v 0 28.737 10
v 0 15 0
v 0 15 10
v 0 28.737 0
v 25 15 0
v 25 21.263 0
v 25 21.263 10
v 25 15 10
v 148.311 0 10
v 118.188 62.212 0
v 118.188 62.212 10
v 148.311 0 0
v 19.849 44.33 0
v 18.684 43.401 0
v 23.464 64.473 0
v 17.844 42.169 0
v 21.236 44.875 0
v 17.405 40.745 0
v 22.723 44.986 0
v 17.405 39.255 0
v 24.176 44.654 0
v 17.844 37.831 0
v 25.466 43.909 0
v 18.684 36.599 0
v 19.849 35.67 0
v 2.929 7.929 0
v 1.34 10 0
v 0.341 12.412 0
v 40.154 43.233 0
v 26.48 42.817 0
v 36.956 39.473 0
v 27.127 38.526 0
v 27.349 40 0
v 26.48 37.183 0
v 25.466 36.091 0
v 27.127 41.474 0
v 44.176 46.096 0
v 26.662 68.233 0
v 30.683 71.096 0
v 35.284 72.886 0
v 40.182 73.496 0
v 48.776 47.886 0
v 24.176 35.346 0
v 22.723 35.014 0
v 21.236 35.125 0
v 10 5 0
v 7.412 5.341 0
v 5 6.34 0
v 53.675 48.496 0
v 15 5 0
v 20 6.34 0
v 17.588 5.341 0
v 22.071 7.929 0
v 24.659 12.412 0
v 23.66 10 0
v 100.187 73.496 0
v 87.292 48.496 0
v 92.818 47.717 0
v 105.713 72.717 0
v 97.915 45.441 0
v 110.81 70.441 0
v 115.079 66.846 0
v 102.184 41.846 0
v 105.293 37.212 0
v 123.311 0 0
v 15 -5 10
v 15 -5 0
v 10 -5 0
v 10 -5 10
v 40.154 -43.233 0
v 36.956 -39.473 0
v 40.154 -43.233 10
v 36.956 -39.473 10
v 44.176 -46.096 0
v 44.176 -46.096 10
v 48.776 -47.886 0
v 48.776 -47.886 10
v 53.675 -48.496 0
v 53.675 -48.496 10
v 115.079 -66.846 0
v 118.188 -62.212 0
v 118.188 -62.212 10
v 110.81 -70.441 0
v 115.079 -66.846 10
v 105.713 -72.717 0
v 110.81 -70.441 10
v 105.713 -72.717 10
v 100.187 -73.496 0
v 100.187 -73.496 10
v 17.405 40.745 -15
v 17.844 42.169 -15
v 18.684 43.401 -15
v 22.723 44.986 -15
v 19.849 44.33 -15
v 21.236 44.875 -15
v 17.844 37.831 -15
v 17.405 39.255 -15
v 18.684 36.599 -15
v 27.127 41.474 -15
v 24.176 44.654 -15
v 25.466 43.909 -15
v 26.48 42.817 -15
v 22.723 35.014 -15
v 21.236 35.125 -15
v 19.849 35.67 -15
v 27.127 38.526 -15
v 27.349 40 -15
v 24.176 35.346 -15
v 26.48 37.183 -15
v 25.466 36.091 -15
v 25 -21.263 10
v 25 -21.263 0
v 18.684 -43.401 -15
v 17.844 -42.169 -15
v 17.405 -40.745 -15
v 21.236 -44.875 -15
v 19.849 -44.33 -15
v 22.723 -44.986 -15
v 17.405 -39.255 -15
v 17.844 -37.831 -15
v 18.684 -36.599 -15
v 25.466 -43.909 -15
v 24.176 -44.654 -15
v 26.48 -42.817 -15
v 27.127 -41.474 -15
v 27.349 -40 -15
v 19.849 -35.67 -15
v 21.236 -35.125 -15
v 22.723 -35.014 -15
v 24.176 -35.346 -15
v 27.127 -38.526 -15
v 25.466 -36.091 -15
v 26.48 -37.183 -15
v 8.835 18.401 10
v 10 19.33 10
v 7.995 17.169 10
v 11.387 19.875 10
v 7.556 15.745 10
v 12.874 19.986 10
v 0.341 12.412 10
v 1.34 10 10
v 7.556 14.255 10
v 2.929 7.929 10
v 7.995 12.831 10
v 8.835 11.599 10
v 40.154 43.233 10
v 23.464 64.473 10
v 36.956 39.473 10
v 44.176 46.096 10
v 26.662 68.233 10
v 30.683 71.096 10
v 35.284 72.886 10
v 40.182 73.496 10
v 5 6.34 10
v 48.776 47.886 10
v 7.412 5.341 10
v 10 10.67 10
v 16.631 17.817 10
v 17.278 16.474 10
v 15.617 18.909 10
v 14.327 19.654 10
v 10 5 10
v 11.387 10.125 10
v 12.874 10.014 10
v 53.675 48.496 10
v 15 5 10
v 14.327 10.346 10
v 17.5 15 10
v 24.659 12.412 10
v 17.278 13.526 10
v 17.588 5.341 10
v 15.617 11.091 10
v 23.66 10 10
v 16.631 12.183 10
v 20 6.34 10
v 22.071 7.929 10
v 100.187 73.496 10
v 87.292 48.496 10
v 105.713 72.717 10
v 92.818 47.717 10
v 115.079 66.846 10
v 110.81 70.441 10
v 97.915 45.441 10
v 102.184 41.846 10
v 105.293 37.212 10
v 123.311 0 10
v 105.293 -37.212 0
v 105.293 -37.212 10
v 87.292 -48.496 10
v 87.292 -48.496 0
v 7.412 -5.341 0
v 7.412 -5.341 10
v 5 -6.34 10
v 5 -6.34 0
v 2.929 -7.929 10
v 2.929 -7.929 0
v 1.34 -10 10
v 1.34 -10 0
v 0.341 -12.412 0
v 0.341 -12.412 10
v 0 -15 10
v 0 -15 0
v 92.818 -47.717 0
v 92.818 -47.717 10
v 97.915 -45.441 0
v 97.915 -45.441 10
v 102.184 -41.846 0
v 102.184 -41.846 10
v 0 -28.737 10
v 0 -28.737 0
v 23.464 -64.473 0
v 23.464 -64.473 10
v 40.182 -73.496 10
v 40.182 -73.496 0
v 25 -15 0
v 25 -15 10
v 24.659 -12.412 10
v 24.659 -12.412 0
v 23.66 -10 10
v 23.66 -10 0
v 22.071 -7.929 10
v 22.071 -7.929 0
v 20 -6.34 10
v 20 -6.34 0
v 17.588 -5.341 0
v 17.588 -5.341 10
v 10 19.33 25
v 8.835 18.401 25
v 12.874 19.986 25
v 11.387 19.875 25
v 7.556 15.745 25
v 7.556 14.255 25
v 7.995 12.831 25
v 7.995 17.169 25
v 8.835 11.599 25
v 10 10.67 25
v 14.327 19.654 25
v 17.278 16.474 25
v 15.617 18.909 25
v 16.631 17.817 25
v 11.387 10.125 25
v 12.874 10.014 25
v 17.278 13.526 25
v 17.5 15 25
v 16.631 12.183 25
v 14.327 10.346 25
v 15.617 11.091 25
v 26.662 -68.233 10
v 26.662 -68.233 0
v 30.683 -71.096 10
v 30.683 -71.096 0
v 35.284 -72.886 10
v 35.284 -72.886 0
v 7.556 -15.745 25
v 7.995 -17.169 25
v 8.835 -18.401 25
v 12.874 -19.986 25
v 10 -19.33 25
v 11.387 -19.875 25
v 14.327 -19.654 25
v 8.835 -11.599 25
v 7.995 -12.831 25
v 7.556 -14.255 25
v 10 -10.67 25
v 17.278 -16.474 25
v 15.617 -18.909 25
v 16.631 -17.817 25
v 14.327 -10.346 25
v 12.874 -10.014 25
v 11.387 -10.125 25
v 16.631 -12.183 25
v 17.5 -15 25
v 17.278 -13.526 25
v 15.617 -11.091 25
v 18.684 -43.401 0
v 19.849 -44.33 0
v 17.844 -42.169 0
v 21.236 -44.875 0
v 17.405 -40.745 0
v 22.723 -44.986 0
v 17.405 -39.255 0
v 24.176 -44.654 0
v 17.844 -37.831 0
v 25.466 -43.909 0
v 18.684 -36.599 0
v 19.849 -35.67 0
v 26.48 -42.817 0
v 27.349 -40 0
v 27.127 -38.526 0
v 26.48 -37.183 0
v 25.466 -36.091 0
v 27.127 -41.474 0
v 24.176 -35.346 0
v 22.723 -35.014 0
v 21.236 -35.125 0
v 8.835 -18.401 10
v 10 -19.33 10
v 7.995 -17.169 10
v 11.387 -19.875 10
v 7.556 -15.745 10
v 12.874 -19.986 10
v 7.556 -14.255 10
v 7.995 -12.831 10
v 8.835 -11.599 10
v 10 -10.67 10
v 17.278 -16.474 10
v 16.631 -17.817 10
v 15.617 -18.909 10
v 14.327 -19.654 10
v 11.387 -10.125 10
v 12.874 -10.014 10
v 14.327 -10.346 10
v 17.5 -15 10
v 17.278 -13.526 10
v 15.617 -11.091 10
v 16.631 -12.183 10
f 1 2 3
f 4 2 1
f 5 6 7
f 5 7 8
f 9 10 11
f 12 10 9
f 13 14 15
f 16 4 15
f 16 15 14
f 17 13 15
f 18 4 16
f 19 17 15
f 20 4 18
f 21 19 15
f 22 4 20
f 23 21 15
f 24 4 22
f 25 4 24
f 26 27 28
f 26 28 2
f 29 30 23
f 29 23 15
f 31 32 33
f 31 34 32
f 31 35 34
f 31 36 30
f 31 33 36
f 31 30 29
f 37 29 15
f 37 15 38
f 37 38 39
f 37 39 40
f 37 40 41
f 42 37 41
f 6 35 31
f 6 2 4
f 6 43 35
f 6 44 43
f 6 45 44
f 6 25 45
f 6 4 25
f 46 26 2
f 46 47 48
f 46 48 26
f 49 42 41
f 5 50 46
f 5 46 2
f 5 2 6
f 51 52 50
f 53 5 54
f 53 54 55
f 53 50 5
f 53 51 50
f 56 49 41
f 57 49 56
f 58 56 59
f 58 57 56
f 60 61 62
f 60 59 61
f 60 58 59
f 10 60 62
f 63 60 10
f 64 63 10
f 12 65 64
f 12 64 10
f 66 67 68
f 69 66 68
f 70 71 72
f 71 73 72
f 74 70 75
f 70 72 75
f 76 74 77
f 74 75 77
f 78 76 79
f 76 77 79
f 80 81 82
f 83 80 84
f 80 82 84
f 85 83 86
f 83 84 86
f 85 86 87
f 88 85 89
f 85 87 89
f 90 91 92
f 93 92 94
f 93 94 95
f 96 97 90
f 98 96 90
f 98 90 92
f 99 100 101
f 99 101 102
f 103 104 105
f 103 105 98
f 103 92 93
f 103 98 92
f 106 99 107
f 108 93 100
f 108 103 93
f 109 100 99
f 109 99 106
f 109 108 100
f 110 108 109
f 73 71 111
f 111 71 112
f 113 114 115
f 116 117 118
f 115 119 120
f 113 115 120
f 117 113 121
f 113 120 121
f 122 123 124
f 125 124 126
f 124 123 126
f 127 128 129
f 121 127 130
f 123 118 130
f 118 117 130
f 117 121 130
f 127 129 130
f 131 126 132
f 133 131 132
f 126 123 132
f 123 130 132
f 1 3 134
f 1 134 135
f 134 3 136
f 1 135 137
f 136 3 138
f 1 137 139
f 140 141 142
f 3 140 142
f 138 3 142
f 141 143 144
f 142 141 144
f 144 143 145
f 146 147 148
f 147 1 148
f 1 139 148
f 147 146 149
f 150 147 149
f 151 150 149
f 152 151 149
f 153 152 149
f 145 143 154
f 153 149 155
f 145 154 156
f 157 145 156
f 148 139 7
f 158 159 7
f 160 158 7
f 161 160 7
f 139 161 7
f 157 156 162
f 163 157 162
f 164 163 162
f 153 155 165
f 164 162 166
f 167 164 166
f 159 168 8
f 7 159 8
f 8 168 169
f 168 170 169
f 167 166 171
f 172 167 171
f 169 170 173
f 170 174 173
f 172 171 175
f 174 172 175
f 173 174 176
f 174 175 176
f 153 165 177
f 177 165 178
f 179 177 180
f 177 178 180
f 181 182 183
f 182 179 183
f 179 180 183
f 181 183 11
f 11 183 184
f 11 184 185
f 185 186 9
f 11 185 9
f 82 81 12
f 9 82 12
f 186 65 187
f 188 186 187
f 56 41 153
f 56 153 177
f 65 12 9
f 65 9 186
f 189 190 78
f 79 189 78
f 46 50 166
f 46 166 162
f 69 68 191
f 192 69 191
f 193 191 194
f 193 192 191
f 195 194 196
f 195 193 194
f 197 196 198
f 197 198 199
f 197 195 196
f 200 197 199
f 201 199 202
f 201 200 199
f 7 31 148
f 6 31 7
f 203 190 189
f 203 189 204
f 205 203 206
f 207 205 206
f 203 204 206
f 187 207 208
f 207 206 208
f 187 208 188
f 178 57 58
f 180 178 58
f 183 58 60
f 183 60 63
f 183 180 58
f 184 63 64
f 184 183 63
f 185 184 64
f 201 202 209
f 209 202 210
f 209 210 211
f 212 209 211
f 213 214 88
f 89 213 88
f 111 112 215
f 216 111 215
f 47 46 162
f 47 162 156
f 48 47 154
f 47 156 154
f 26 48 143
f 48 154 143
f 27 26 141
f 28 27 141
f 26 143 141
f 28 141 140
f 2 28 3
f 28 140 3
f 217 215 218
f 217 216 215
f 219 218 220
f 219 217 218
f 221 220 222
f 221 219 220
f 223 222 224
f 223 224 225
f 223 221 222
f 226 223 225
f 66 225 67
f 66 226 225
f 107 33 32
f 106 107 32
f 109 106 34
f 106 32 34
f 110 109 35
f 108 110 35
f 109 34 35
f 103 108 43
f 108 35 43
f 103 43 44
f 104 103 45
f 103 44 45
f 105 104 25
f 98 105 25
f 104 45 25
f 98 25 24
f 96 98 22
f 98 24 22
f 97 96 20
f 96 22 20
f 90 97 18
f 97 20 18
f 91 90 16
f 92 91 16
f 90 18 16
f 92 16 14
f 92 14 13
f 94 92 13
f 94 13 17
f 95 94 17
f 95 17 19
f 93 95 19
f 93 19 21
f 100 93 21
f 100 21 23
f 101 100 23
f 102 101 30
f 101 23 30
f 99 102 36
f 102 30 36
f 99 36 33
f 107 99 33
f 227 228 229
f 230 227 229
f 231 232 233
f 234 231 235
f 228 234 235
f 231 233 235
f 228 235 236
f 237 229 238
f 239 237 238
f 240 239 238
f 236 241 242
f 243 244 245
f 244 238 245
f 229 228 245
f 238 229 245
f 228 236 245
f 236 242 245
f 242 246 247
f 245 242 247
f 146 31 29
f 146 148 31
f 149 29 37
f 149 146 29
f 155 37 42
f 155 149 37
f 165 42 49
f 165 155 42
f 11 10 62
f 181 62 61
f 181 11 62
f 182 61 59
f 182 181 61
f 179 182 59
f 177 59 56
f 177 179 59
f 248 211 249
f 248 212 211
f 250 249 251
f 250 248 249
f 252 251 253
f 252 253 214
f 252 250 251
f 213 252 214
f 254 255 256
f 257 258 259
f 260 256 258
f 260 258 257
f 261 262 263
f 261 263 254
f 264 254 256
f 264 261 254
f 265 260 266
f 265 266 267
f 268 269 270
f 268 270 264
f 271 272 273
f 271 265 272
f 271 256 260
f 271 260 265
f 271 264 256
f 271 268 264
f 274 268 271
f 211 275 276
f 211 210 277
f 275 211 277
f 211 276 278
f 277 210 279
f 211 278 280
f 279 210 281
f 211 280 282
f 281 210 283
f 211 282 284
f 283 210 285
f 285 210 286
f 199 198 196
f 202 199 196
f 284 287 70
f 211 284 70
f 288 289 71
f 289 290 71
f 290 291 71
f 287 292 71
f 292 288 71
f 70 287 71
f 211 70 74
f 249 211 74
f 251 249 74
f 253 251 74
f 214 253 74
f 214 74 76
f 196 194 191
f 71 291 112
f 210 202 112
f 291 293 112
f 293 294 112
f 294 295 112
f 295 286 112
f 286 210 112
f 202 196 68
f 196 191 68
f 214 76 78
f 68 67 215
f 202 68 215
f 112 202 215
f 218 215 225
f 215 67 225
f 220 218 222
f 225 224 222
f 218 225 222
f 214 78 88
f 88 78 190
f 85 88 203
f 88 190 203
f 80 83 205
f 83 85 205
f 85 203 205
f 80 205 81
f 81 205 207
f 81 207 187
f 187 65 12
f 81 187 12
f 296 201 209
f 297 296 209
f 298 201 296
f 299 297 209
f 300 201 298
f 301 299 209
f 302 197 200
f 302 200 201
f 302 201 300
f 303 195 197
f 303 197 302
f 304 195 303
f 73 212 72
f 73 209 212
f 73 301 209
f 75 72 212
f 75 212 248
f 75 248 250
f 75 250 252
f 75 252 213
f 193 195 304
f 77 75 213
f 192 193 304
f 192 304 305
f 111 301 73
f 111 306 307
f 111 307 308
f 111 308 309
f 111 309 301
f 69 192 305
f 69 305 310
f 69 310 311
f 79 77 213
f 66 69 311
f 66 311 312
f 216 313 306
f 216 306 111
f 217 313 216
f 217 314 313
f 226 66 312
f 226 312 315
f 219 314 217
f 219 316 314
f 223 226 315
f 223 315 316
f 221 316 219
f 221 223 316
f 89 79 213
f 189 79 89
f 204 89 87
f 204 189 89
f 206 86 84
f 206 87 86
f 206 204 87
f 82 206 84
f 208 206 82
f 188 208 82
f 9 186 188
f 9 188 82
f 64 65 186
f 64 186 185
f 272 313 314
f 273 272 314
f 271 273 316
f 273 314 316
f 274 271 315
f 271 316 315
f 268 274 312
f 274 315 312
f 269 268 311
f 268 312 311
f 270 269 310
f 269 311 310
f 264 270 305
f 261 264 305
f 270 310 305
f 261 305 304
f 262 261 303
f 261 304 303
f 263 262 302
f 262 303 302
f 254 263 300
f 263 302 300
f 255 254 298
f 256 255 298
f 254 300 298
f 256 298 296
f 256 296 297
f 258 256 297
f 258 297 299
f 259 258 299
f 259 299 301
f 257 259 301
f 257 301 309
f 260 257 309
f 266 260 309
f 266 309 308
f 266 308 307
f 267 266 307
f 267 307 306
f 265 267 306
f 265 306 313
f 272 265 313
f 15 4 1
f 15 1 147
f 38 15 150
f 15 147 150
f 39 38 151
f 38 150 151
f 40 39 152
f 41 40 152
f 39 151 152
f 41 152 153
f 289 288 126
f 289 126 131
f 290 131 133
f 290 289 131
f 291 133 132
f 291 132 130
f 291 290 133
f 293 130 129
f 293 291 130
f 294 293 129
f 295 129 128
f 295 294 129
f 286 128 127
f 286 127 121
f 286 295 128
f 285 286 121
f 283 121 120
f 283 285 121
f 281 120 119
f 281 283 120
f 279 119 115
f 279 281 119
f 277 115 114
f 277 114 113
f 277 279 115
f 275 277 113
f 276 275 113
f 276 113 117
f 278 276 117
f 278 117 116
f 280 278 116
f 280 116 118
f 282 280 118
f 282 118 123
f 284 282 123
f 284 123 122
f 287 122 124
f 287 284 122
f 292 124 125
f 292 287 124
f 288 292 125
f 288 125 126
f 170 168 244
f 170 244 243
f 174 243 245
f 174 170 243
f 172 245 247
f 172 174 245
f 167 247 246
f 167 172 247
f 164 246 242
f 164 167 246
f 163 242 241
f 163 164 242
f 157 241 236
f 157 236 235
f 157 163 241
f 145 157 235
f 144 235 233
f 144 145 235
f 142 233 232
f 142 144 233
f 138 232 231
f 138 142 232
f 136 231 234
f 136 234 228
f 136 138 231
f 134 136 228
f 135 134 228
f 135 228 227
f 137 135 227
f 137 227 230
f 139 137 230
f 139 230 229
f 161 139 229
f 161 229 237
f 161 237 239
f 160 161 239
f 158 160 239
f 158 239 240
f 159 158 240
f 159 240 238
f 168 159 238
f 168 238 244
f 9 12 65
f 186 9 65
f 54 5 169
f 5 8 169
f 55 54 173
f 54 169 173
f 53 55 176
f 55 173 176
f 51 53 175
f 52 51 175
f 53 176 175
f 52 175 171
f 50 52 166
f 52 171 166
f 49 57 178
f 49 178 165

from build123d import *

# Parameters (mm, degrees)
F0_R     = 5
F1_DEPTH = 10
F2_DEPTH = 15
F3_DEPTH = 25
F9_R     = 10
F10_R    = 20


with BuildPart() as f1:
    # F0 (on Top) → F1 (new body)
    with BuildSketch(Plane.XY):
        Polygon((99.829165, -48.4956), (42.880688, -48.4956), (25, -21.263061), (25, -5), (0, -5), (0, -28.736939), (29.388212, -73.4956), (112.724133, -73.4956), (148.310796, 0), (123.310796, 0), align=None)
        with Locations((22.348891, -40)):
            Circle(F0_R, mode=Mode.SUBTRACT)
        with Locations((12.5, -15)):
            Circle(F0_R, mode=Mode.SUBTRACT)
        with Locations((22.348891, -40)):
            Circle(F0_R)
        with Locations((12.5, -15)):
            Circle(F0_R)
    extrude(amount=F1_DEPTH)

    # F0 (on Top) → F2 (join)
    with BuildSketch(Plane.XY):
        with Locations((22.348891, -40)):
            Circle(F0_R)
    extrude(amount=-F2_DEPTH)

    # F0 (on Top) → F3 (join)
    with BuildSketch(Plane.XY):
        with Locations((12.5, -15)):
            Circle(F0_R)
    extrude(amount=F3_DEPTH)

    # F9
    f9_edges = [f1.edges().sort_by_distance(p)[0] for p in [
        (0, -5, 5),
        (25, -5, 5),
    ]]
    fillet(f9_edges, radius=F9_R)

    # F10
    f10_edges = [f1.edges().sort_by_distance(p)[0] for p in [
        (42.880688, -48.4956, 5),
        (99.829165, -48.4956, 5),
        (29.388212, -73.4956, 5),
        (112.724133, -73.4956, 5),
    ]]
    fillet(f10_edges, radius=F10_R)


with BuildPart() as f4_1:
    # F4: copy of F1
    add(f1.part)


with BuildPart() as f6_1:
    # F6: instance of F1
    add(f1.part.mirror(Plane.XZ))


with BuildPart() as f7_1:
    # F7: copy of F6_1
    add(f6_1.part)


solid = Compound([f1.part, f6_1.part])
